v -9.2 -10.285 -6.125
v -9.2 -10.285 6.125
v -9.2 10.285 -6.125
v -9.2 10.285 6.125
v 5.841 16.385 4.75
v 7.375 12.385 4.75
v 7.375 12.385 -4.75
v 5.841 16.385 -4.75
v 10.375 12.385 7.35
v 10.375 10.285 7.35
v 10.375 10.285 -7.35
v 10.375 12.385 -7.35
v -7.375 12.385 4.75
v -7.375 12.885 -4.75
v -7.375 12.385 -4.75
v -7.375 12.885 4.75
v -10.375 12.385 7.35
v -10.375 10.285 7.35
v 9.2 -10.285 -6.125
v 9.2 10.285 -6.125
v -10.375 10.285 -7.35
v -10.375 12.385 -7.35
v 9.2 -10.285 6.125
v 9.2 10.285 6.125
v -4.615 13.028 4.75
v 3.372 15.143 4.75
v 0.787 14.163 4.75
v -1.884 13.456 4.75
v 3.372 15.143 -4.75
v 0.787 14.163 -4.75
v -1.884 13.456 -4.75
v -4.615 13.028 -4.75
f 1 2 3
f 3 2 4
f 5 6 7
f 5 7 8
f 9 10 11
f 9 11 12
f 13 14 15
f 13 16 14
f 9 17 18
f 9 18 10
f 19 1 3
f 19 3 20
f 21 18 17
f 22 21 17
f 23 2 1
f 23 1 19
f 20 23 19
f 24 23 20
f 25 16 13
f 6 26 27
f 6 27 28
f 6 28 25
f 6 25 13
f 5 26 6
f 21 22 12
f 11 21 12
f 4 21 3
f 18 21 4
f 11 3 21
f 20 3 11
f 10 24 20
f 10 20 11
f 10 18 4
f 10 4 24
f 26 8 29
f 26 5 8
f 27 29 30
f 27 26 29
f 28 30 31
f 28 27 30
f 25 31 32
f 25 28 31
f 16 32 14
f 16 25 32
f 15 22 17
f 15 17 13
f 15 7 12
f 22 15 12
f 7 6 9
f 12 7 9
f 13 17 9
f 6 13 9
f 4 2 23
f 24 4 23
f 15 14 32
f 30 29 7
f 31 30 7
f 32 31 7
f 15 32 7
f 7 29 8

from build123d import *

# Parameters (mm, degrees)
BOSS_EXTRUDE1_DEPTH      = 6.125
BOSS_EXTRUDE1_DEPTH_BACK = 6.125
SKETCH1_W                = 18.4
SKETCH1_H                = 20.57
BOSS_EXTRUDE2_DEPTH      = 7.35
BOSS_EXTRUDE2_DEPTH_BACK = 7.35
BOSS_EXTRUDE3_DEPTH      = 4.75
BOSS_EXTRUDE3_DEPTH_BACK = 4.75


with BuildPart() as part:
    # Sketch1 → Boss-Extrude1 (new, two sides: drawn at the far end of the back side and taken through both)
    with BuildSketch(Plane.XY.offset(-BOSS_EXTRUDE1_DEPTH_BACK)):
        Rectangle(SKETCH1_W, SKETCH1_H)
    extrude(amount=BOSS_EXTRUDE1_DEPTH + BOSS_EXTRUDE1_DEPTH_BACK)

    # Sketch1<3> → Boss-Extrude2 (add, two sides: drawn at the far end of the back side and taken through both)
    with BuildSketch(Plane.XY.offset(-BOSS_EXTRUDE2_DEPTH_BACK)):
        Polygon((7.375, 12.385), (-7.375, 12.385), (-10.375, 12.385), (-10.375, 10.285), (-9.2, 10.285), (9.2, 10.285), (10.375, 10.285), (10.375, 12.385), align=None)
    extrude(amount=BOSS_EXTRUDE2_DEPTH + BOSS_EXTRUDE2_DEPTH_BACK)

    # Sketch1<4> → Boss-Extrude3 (add, two sides: drawn at the far end of the back side and taken through both)
    with BuildSketch(Plane.XY.offset(-BOSS_EXTRUDE3_DEPTH_BACK)):
        with BuildLine():
            Line((-7.375, 12.885), (-7.375, 12.385))
            Line((-7.375, 12.385), (7.375, 12.385))
            Line((7.375, 12.385), (5.840957819, 16.385))
            ThreePointArc((5.840957819, 16.385), (-0.539220215, 13.77482664), (-7.375, 12.885))
        make_face()
    extrude(amount=BOSS_EXTRUDE3_DEPTH + BOSS_EXTRUDE3_DEPTH_BACK)


solid = part.part
